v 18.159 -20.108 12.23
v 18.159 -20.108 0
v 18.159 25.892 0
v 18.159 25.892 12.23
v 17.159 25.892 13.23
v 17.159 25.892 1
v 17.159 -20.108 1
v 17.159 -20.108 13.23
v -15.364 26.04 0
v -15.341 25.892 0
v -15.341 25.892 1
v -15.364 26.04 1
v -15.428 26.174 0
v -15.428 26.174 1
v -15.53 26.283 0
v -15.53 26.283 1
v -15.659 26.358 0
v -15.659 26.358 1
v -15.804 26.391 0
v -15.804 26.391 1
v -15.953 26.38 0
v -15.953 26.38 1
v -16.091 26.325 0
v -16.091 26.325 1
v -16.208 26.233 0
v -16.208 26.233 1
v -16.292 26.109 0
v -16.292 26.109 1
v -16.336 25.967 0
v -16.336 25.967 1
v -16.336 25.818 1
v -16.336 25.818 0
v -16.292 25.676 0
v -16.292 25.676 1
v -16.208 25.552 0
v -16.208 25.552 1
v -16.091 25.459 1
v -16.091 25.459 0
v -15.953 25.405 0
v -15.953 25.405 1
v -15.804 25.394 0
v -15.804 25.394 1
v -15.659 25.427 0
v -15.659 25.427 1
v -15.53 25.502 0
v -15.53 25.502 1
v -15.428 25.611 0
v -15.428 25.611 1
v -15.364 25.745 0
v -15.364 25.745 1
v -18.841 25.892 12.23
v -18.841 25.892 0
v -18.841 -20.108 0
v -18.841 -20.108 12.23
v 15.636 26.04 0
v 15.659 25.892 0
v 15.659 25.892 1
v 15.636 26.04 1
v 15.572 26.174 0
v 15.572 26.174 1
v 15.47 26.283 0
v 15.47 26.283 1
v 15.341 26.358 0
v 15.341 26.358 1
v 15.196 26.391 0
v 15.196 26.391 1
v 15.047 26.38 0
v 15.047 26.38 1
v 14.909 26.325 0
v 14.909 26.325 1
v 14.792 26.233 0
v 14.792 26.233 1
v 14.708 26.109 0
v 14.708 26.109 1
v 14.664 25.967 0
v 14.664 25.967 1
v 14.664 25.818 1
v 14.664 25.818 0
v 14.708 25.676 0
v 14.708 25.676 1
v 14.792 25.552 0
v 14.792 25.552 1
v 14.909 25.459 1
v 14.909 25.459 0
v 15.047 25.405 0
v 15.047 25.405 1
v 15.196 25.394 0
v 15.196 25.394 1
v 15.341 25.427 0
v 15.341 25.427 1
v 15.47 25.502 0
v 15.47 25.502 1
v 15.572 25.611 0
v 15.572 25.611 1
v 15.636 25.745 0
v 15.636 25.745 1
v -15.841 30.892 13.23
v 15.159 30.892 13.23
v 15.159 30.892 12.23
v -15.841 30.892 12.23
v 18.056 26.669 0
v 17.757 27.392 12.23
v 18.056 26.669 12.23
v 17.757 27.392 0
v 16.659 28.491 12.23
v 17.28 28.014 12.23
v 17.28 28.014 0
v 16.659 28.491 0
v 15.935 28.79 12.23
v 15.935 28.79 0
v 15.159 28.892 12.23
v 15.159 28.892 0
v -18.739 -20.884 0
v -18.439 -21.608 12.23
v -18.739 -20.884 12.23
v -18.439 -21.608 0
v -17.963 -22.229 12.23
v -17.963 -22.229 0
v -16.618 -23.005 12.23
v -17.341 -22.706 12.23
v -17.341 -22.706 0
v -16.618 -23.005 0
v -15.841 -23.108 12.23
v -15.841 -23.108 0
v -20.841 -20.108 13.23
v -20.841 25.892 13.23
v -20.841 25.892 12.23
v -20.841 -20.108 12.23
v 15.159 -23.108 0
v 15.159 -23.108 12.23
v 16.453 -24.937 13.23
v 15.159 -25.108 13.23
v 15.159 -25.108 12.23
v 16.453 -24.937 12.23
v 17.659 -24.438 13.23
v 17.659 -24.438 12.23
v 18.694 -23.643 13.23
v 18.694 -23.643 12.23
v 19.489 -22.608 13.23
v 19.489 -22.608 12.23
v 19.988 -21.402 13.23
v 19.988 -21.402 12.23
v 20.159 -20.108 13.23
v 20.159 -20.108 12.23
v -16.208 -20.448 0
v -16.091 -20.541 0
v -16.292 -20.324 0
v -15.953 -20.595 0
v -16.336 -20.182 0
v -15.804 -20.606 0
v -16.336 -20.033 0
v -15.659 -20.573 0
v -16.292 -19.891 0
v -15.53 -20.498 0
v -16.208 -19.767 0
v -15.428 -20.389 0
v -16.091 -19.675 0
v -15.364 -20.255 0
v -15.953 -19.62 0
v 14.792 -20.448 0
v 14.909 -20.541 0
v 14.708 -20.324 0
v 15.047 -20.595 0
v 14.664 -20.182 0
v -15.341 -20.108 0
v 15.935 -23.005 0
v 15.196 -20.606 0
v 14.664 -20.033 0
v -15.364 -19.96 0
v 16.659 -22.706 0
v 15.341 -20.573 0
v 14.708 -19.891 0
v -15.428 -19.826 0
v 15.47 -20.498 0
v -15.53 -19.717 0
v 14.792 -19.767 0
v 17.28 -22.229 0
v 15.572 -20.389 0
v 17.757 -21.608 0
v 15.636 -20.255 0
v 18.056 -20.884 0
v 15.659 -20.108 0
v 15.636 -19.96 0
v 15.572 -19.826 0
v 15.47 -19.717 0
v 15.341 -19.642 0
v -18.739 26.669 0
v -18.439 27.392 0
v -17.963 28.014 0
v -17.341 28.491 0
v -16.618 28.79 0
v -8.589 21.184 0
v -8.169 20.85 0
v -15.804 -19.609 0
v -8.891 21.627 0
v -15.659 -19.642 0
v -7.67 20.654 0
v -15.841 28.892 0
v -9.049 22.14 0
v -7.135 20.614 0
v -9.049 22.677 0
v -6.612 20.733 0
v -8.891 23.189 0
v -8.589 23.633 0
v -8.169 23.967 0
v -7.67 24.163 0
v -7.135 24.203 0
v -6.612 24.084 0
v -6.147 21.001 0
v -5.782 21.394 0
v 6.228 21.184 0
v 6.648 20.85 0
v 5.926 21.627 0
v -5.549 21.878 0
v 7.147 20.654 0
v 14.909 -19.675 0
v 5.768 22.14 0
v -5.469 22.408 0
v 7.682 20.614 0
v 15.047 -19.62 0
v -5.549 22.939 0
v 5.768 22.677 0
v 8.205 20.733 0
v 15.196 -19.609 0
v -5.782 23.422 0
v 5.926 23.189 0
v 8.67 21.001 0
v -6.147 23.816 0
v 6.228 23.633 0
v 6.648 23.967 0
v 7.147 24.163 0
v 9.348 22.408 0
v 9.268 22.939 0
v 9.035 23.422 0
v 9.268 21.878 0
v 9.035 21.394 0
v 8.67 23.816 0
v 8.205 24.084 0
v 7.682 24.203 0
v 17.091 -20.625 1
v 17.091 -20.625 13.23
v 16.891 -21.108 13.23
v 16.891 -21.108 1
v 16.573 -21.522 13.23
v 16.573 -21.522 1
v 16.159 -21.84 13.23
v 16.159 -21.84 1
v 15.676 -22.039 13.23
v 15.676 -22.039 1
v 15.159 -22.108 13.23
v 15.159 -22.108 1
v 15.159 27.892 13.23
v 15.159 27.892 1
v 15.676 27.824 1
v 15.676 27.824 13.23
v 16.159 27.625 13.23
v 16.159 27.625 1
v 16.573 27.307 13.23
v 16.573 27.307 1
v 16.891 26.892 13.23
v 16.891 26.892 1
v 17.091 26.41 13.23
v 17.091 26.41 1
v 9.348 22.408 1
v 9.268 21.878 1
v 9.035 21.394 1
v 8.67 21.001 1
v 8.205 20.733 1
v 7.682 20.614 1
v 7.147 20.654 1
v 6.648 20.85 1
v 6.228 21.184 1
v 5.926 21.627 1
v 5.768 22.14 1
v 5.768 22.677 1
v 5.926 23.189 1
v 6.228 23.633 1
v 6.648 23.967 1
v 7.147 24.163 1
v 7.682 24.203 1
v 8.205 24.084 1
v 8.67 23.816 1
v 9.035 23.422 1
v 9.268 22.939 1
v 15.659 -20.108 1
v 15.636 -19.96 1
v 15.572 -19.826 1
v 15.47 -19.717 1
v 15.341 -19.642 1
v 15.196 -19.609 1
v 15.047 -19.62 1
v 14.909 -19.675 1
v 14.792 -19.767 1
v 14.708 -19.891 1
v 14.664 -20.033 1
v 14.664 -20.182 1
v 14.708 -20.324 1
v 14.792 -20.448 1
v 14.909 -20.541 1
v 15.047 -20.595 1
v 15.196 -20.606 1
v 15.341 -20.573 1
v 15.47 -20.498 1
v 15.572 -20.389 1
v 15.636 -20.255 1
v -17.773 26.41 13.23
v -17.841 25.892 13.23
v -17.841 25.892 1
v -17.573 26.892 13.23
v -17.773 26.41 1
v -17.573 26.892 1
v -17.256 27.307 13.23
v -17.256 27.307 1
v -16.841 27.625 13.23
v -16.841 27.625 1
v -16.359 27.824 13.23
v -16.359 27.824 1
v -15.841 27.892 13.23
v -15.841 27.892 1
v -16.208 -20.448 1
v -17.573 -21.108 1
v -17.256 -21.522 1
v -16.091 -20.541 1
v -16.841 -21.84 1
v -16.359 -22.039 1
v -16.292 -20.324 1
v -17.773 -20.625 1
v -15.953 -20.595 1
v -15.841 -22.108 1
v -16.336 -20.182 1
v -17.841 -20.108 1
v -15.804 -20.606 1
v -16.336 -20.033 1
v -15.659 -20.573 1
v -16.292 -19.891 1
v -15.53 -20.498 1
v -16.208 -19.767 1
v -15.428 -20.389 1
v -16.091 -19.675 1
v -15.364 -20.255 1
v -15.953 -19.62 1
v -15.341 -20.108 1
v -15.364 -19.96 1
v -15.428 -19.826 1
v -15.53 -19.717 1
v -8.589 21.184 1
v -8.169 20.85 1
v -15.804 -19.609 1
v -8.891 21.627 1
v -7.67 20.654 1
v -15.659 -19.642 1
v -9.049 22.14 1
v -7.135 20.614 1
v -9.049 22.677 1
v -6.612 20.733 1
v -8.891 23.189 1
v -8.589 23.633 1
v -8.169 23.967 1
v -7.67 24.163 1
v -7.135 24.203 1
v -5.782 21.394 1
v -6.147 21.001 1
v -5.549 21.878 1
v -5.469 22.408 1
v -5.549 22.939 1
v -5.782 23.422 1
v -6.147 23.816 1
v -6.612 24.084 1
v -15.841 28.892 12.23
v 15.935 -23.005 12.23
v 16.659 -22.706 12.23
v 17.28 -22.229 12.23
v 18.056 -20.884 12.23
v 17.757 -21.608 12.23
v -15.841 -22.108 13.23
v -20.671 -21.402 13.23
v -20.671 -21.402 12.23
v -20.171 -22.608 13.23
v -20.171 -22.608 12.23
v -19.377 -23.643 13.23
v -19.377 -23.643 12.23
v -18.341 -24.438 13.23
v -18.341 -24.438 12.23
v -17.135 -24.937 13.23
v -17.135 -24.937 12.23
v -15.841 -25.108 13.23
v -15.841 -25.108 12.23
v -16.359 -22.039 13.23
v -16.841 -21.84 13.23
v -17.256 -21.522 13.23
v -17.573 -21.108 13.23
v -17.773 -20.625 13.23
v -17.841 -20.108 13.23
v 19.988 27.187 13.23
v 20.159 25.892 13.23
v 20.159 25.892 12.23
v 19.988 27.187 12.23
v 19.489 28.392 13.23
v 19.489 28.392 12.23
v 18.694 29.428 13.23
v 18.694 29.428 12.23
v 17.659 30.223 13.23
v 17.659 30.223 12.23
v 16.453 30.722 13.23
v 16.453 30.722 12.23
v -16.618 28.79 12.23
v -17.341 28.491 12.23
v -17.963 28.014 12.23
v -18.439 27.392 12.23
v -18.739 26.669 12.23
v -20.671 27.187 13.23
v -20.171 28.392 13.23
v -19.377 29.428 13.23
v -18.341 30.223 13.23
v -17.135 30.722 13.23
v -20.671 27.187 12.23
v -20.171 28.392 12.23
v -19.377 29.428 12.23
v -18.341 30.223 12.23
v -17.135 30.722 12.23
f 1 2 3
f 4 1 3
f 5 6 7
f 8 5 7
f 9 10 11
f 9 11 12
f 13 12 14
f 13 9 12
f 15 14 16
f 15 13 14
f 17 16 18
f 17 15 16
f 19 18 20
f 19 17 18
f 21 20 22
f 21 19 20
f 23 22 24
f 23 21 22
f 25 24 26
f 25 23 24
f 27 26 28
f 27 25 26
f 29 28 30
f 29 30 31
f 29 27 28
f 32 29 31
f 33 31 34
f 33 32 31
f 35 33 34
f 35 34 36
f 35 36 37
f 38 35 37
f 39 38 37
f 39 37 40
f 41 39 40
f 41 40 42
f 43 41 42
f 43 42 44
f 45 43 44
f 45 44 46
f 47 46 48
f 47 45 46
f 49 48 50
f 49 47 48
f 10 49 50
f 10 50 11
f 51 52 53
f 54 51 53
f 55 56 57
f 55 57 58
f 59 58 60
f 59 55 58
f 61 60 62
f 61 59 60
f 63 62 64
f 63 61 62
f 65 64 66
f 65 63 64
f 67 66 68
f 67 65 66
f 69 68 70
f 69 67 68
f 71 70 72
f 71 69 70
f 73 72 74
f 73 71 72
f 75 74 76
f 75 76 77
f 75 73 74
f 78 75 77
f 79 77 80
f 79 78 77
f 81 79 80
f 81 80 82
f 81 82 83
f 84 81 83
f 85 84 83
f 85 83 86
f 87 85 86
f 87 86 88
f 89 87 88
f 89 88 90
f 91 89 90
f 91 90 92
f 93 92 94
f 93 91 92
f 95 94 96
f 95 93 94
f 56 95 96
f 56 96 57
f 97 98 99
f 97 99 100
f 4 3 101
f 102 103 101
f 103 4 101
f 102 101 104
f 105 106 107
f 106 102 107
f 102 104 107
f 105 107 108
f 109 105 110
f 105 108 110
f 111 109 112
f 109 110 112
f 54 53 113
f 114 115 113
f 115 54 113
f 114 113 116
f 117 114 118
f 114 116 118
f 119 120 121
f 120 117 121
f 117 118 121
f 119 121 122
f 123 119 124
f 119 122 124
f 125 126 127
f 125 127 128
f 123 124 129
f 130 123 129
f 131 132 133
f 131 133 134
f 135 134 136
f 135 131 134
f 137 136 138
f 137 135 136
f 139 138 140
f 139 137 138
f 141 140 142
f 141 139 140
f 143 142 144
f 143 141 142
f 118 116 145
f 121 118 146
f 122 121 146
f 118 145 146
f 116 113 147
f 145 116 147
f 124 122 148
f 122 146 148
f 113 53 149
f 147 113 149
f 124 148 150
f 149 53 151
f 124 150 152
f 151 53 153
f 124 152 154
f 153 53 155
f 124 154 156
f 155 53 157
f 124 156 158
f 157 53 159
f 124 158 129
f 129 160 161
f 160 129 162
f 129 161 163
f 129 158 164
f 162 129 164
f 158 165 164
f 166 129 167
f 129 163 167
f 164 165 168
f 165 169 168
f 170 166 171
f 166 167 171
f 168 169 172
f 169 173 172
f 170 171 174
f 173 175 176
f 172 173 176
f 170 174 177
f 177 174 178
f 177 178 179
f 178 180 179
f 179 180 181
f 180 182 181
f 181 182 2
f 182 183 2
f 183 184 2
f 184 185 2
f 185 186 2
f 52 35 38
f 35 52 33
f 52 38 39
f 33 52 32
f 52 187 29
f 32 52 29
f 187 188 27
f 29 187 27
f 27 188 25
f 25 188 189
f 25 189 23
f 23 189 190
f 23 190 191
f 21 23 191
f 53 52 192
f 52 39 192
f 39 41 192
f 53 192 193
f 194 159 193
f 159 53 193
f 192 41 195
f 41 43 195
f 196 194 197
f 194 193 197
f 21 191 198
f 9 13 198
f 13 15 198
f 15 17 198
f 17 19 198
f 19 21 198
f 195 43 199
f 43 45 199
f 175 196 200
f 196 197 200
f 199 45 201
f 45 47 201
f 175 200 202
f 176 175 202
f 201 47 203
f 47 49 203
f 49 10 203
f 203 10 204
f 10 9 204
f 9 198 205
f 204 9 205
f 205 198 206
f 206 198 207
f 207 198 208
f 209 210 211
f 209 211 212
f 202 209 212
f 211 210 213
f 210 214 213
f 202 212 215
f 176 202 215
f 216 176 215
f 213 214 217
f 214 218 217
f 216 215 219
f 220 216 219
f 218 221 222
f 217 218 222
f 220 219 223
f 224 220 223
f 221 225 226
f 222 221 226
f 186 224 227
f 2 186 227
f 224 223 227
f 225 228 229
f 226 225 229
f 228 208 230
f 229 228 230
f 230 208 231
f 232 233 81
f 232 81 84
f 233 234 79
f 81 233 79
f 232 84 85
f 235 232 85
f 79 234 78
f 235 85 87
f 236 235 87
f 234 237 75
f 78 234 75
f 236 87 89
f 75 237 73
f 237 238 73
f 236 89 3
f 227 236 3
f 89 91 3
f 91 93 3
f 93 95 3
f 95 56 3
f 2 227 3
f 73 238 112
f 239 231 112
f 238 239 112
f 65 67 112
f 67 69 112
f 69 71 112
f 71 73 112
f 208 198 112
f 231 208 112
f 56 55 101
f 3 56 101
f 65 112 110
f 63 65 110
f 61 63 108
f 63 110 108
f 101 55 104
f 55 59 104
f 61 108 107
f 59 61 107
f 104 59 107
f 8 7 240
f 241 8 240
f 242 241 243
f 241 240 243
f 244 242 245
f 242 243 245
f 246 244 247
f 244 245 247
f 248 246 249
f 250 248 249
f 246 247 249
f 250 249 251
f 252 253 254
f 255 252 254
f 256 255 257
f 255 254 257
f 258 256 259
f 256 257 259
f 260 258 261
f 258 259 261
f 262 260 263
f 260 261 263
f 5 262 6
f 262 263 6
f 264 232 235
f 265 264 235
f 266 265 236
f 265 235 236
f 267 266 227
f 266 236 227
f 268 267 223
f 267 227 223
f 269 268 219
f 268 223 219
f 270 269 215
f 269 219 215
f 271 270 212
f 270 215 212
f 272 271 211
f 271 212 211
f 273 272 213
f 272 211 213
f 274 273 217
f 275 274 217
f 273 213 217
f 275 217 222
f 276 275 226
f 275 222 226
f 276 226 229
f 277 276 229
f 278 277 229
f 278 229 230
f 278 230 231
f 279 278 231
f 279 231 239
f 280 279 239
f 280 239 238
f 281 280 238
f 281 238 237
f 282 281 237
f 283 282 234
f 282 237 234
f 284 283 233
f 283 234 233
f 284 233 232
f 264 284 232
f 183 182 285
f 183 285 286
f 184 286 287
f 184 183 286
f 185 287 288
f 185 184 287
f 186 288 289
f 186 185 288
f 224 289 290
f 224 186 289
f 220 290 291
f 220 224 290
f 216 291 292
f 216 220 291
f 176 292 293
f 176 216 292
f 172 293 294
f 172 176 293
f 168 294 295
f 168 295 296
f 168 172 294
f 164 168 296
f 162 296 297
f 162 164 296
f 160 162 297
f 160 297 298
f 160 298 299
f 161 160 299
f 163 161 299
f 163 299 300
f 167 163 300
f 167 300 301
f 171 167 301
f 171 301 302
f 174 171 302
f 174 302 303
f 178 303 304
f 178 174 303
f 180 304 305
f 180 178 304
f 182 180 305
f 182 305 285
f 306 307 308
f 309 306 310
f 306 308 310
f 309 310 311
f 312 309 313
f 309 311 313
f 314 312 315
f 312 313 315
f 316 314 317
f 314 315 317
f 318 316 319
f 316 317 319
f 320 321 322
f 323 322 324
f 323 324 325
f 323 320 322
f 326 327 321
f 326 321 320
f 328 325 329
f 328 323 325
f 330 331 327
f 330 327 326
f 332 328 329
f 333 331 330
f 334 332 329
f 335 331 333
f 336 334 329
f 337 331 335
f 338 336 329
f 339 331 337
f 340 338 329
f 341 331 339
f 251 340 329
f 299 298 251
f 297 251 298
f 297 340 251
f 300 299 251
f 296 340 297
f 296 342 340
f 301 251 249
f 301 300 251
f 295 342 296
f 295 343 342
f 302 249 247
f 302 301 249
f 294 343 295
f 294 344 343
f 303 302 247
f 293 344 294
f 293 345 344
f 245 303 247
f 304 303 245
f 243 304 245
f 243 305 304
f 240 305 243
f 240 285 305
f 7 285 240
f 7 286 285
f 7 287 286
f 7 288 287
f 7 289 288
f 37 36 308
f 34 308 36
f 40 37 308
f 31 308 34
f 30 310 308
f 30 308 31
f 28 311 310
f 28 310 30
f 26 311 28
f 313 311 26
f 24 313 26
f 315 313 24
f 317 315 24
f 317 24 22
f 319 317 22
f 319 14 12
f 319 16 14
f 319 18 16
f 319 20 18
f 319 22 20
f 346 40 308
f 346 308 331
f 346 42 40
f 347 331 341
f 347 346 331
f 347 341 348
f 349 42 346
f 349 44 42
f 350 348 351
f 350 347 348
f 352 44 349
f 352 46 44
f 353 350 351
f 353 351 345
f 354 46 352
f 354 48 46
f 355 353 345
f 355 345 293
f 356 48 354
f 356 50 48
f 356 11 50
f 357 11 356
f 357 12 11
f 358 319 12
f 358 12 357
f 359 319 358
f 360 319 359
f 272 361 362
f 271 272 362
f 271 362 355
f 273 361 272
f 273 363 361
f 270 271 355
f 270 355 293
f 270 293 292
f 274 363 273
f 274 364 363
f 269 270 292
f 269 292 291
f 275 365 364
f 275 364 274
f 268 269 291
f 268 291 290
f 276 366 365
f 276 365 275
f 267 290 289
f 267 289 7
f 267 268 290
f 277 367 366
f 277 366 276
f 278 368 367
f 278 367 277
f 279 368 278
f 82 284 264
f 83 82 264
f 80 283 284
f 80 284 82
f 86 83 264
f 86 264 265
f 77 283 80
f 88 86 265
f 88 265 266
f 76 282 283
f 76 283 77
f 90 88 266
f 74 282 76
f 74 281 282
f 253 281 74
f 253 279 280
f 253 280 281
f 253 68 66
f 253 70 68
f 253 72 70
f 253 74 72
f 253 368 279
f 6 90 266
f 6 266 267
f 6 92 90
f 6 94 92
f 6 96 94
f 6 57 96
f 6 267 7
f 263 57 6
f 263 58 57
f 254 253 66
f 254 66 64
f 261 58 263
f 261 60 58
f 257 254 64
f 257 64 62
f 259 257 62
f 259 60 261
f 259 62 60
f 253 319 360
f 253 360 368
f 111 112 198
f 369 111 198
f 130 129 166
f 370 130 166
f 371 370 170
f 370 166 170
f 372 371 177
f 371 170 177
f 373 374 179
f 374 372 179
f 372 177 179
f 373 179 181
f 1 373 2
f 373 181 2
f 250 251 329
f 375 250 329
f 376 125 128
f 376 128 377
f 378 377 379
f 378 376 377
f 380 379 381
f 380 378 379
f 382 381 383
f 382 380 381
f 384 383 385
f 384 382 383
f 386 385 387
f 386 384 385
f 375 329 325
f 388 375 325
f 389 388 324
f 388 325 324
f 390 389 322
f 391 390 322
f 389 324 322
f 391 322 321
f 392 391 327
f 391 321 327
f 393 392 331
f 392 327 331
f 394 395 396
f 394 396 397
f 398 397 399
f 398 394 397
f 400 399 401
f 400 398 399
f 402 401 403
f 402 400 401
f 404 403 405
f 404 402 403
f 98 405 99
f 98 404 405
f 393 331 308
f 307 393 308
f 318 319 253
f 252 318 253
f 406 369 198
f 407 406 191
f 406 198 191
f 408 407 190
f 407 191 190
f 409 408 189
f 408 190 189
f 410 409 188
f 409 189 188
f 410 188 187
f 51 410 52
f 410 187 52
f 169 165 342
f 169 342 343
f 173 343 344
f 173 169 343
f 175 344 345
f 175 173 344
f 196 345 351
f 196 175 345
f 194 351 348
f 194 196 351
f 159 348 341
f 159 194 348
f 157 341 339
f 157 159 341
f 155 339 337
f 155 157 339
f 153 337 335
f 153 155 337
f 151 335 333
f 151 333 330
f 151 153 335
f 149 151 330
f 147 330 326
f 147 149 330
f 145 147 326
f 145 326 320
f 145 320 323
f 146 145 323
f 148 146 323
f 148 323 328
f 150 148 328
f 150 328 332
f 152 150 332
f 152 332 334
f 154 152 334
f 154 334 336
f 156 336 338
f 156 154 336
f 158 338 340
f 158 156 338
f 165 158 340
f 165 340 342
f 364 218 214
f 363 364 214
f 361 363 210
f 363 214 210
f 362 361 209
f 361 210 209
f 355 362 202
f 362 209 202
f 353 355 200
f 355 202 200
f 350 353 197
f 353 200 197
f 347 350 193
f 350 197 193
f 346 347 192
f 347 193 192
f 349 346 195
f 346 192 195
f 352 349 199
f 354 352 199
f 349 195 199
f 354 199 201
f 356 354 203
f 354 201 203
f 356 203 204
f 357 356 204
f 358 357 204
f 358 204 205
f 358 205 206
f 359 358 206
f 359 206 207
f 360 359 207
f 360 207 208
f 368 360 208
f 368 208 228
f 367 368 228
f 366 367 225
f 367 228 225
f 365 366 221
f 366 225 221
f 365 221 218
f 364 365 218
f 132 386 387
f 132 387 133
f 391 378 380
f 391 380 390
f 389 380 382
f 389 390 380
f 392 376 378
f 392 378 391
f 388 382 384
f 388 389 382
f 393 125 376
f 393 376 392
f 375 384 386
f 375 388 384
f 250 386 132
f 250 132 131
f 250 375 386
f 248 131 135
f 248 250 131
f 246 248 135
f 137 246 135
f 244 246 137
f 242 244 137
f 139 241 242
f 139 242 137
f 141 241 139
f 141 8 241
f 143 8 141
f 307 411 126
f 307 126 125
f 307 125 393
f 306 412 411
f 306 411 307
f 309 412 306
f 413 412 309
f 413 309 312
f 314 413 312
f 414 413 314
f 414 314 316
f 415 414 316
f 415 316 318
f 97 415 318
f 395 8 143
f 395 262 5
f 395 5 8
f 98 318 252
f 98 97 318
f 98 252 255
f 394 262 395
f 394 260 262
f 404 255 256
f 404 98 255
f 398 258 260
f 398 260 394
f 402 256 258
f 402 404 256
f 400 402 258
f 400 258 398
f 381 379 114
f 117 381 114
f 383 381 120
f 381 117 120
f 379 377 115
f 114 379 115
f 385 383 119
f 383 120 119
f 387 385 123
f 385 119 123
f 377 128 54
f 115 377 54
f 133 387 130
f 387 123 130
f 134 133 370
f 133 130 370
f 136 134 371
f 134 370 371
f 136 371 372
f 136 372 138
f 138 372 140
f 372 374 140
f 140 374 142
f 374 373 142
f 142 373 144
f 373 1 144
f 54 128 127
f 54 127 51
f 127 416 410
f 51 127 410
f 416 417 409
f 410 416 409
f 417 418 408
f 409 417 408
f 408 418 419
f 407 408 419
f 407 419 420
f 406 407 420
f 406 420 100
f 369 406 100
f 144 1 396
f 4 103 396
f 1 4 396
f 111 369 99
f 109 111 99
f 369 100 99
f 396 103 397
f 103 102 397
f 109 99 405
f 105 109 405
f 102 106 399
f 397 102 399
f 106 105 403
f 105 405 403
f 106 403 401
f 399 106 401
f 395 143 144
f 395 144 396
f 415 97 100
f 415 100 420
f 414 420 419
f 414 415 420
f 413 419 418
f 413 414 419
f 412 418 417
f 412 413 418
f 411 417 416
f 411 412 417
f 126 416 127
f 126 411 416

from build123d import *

# Parameters (mm, degrees)
F0_R     = 0.5
F1_DEPTH = 1
F2_DEPTH = 13.23
F3_R     = 1.8
F4_DEPTH = 1
F6_DEPTH = 1


with BuildPart() as f1:
    # F0 (on Top) → F1 (new body)
    with BuildSketch(Plane.XY):
        with BuildLine():
            ThreePointArc((-17.84133, -20.107526), (-17.255543, -21.521739), (-15.84133, -22.107526))
            Line((-15.84133, -22.107526), (15.15867, -22.107526))
            ThreePointArc((15.15867, -22.107526), (16.572884, -21.521739), (17.15867, -20.107526))
            Line((17.15867, -20.107526), (17.15867, 25.892474))
            ThreePointArc((17.15867, 25.892474), (16.572884, 27.306688), (15.15867, 27.892474))
            Line((15.15867, 27.892474), (-15.84133, 27.892474))
            ThreePointArc((-15.84133, 27.892474), (-17.255543, 27.306688), (-17.84133, 25.892474))
            Line((-17.84133, 25.892474), (-17.84133, -20.107526))
        make_face()
        with Locations((-15.84133, -20.107526)):
            Circle(F0_R, mode=Mode.SUBTRACT)
        with Locations((15.15867, -20.107526)):
            Circle(F0_R, mode=Mode.SUBTRACT)
        with Locations((-15.84133, 25.892474)):
            Circle(F0_R, mode=Mode.SUBTRACT)
        with Locations((15.15867, 25.892474)):
            Circle(F0_R, mode=Mode.SUBTRACT)
    extrude(amount=F1_DEPTH)

    # F0 (on Top) → F2 (join)
    with BuildSketch(Plane.XY):
        with BuildLine():
            Line((15.15867, 28.892474), (-15.84133, 28.892474))
            ThreePointArc((-15.84133, 28.892474), (-17.96265, 28.013795), (-18.84133, 25.892474))
            Line((-18.84133, 25.892474), (-18.84133, -20.107526))
            ThreePointArc((-18.84133, -20.107526), (-17.96265, -22.228846), (-15.84133, -23.107526))
            Line((-15.84133, -23.107526), (15.15867, -23.107526))
            ThreePointArc((15.15867, -23.107526), (17.279991, -22.228846), (18.15867, -20.107526))
            Line((18.15867, -20.107526), (18.15867, 25.892474))
            ThreePointArc((18.15867, 25.892474), (17.279991, 28.013795), (15.15867, 28.892474))
        make_face()
        with BuildLine():
            Line((15.15867, -22.107526), (-15.84133, -22.107526))
            ThreePointArc((-15.84133, -22.107526), (-17.255543, -21.521739), (-17.84133, -20.107526))
            Line((-17.84133, -20.107526), (-17.84133, 25.892474))
            ThreePointArc((-17.84133, 25.892474), (-17.255543, 27.306688), (-15.84133, 27.892474))
            Line((-15.84133, 27.892474), (15.15867, 27.892474))
            ThreePointArc((15.15867, 27.892474), (16.572884, 27.306688), (17.15867, 25.892474))
            Line((17.15867, 25.892474), (17.15867, -20.107526))
            ThreePointArc((17.15867, -20.107526), (16.572884, -21.521739), (15.15867, -22.107526))
        make_face(mode=Mode.SUBTRACT)
    extrude(amount=F2_DEPTH)

    # F3 (on face) → F4 (cut)
    with BuildSketch(Plane(origin=(0, 0, 0), x_dir=(1, 0, 0), z_dir=(0, 0, -1))):
        with Locations((-7.26933, -22.408474)):
            Circle(F3_R)
        with Locations((7.54767, -22.408474)):
            Circle(F3_R)
    extrude(amount=-F4_DEPTH, mode=Mode.SUBTRACT)

    # F5 (on face) → F6 (join)
    with BuildSketch(Plane.XY.offset(13.23)):
        with BuildLine():
            Line((15.15867, 30.892474), (-15.84133, 30.892474))
            ThreePointArc((-15.84133, 30.892474), (-19.376864, 29.428008), (-20.84133, 25.892474))
            Line((-20.84133, 25.892474), (-20.84133, -20.107526))
            ThreePointArc((-20.84133, -20.107526), (-19.376864, -23.64306), (-15.84133, -25.107526))
            Line((-15.84133, -25.107526), (15.15867, -25.107526))
            ThreePointArc((15.15867, -25.107526), (18.694204, -23.64306), (20.15867, -20.107526))
            Line((20.15867, -20.107526), (20.15867, 25.892474))
            ThreePointArc((20.15867, 25.892474), (18.694204, 29.428008), (15.15867, 30.892474))
        make_face()
        with BuildLine():
            ThreePointArc((15.15867, 28.892474), (17.279991, 28.013795), (18.15867, 25.892474))
            Line((18.15867, 25.892474), (18.15867, -20.107526))
            ThreePointArc((18.15867, -20.107526), (17.279991, -22.228846), (15.15867, -23.107526))
            Line((15.15867, -23.107526), (-15.84133, -23.107526))
            ThreePointArc((-15.84133, -23.107526), (-17.96265, -22.228846), (-18.84133, -20.107526))
            Line((-18.84133, -20.107526), (-18.84133, 25.892474))
            ThreePointArc((-18.84133, 25.892474), (-17.96265, 28.013795), (-15.84133, 28.892474))
            Line((-15.84133, 28.892474), (15.15867, 28.892474))
        make_face(mode=Mode.SUBTRACT)
    extrude(amount=-F6_DEPTH)


solid = f1.part
